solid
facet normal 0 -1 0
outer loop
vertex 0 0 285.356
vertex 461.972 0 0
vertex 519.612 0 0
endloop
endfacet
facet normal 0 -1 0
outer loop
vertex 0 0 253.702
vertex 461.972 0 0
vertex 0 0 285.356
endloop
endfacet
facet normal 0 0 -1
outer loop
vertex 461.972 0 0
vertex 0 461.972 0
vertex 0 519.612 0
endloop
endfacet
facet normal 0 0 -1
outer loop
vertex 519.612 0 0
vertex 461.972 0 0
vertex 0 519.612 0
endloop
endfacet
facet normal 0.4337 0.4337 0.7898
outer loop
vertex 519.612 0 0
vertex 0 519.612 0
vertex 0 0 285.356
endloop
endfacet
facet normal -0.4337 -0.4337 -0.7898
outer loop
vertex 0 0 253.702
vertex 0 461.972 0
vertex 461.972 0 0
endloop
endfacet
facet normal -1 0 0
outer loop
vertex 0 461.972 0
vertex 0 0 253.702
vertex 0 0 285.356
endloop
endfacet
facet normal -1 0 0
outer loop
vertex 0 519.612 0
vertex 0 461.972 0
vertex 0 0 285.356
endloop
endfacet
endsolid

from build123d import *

# Parameters (mm, degrees)
F5_DEPTH      = 25
F7_DEPTH      = 343
F7_DEPTH_BACK = 50
F8_W          = 519.6738243103
F8_H          = 31.4134806395
F9_DEPTH      = 544


with BuildPart() as f5:
    # F4 (on 3pt) → F5 (new body)
    with BuildSketch(Plane(origin=(97.7491601024, 97.7491601024, 177.9939324181), x_dir=(0.9010441054, -0.2087794804, -0.3801718673), z_dir=(0.4337274722, 0.4337274722, 0.7897853884))):
        Polygon((-108.4843233732, 455.4515841965), (-108.4843233732, -137.3592433699), (468.1933296886, 0), align=None)
    extrude(amount=-F5_DEPTH)

    # F6 (on Top) → F7 (cut, two sides)
    with BuildSketch(Plane.XY) as f7_sk:
        Polygon((0, 577.9420137405), (-45, 577.9420137405), (-45, -45), (592.9301977158, -45), (592.9301977158, 0), (0, 0), align=None)
    extrude(amount=F7_DEPTH, mode=Mode.SUBTRACT)
    extrude(f7_sk.sketch, amount=-F7_DEPTH_BACK, mode=Mode.SUBTRACT)

    # F8 (on Front) → F9 (cut)
    with BuildSketch(Plane.XZ):
        with Locations((259.8369121552, -15.7067403197)):
            Rectangle(F8_W, F8_H)
    extrude(amount=-F9_DEPTH, mode=Mode.SUBTRACT)


solid = f5.part
